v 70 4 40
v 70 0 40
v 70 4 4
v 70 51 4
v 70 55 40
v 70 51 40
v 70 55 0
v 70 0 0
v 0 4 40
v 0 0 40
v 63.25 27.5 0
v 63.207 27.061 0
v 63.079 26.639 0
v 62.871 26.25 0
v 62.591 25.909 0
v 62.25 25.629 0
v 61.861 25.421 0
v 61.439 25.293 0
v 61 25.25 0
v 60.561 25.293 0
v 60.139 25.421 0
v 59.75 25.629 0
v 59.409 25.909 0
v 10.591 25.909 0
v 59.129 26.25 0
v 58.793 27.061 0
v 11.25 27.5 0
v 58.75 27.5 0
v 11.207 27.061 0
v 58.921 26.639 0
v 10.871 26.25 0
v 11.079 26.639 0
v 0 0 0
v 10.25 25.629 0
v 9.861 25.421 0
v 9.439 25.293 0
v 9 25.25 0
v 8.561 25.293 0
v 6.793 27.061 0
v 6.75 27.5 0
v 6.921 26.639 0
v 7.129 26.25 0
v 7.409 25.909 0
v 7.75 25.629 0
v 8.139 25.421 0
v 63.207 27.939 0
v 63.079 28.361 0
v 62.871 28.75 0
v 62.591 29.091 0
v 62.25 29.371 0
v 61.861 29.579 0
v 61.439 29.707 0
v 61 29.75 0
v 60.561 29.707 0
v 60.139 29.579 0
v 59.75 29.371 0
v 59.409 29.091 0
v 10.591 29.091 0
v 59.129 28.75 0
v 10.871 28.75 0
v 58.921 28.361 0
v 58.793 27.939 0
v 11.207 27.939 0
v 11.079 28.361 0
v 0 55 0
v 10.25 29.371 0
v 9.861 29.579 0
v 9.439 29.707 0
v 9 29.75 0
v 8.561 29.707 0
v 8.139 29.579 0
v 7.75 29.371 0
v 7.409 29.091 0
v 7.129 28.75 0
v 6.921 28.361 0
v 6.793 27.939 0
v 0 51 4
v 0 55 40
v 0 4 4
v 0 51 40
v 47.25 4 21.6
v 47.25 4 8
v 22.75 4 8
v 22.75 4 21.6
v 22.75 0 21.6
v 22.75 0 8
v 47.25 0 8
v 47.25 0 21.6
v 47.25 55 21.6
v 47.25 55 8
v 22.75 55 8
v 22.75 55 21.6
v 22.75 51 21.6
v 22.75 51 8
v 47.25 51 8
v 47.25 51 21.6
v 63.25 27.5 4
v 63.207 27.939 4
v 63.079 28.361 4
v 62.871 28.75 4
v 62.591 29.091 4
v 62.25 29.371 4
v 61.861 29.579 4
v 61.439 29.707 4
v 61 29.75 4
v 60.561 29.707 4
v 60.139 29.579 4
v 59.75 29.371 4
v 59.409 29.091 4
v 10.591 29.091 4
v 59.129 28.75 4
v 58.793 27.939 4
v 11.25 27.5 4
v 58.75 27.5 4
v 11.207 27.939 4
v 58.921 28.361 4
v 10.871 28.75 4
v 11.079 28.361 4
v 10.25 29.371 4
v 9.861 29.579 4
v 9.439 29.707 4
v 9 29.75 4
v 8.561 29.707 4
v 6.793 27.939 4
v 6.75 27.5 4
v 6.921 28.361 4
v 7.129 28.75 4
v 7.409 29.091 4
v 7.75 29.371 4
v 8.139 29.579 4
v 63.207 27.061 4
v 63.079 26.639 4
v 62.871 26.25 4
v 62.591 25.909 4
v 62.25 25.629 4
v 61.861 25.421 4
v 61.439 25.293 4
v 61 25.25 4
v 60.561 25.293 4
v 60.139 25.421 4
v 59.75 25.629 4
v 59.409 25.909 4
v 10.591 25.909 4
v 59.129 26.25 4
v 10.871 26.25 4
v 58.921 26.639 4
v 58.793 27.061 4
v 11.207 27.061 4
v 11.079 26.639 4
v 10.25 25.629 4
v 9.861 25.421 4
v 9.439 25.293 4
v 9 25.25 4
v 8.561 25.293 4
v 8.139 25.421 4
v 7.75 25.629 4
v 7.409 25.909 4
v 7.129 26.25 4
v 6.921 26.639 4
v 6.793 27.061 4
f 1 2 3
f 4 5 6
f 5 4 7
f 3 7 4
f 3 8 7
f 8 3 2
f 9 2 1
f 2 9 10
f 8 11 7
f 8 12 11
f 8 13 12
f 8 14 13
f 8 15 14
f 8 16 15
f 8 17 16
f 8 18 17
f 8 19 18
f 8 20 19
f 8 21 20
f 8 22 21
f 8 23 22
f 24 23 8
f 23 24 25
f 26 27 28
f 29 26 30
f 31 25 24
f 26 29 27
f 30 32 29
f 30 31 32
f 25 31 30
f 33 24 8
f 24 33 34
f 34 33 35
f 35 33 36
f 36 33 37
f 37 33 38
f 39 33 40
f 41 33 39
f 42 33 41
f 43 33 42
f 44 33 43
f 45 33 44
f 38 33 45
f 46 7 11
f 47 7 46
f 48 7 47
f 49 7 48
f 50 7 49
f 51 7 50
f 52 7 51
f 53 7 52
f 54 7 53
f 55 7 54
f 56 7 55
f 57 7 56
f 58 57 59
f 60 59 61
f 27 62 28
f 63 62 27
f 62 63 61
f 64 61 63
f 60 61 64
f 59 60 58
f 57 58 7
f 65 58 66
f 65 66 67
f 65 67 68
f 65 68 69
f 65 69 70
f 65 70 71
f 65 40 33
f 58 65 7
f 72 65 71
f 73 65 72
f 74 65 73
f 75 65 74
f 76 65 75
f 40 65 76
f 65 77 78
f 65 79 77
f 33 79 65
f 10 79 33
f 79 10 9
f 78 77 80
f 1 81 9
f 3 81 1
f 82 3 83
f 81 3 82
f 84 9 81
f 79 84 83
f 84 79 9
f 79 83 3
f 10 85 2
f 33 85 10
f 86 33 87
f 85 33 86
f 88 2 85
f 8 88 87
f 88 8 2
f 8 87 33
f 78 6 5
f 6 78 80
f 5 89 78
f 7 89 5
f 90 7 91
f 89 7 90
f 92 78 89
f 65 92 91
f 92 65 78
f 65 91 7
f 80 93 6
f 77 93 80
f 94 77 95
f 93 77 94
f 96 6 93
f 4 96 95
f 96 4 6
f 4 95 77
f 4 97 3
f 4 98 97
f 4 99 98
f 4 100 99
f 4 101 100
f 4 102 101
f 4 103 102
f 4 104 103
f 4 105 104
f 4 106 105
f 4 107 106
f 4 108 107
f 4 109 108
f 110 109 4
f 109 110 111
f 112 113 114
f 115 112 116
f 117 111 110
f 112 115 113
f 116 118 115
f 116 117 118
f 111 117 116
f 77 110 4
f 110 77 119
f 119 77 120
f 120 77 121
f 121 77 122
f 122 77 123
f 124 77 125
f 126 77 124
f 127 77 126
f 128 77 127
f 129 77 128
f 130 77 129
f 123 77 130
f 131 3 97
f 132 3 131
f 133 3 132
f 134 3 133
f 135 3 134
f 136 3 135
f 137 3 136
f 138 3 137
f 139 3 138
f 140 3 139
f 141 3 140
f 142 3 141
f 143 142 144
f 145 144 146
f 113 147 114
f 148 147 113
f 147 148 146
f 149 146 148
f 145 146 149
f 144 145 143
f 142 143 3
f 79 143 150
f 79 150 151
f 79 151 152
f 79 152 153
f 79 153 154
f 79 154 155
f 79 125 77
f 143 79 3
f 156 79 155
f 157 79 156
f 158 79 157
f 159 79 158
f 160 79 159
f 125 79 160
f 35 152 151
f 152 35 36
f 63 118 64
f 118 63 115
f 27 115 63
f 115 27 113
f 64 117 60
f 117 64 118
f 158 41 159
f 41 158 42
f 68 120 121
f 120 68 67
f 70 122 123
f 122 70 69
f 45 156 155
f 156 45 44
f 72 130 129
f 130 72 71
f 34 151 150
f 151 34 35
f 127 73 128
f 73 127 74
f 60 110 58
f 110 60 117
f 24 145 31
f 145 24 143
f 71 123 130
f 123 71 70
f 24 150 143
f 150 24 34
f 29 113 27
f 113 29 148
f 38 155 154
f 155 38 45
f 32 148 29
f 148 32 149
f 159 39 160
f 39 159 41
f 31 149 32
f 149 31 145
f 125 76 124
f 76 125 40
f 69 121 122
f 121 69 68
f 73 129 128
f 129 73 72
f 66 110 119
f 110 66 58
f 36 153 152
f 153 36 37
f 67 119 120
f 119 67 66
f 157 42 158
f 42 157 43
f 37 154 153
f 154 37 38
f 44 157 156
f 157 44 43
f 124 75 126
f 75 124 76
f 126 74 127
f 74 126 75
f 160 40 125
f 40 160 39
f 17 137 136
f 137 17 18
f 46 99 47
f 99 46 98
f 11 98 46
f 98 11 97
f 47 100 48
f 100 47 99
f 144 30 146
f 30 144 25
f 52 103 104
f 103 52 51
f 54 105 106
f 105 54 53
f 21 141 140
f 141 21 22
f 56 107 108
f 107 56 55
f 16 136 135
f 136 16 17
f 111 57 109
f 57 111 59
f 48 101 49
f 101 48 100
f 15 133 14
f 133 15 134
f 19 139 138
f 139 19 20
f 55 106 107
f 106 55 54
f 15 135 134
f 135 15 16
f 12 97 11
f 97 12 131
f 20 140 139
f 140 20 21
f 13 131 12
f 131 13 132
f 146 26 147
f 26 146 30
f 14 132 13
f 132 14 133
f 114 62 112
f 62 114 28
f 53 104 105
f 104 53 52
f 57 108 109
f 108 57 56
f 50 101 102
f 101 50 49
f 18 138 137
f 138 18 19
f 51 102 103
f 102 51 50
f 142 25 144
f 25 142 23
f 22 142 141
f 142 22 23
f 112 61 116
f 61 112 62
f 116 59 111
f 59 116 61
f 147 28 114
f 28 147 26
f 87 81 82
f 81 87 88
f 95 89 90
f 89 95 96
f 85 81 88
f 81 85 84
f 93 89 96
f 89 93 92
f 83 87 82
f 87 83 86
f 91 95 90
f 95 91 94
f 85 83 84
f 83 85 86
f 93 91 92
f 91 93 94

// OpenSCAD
$fn = 32;

// ----------------------------------------------------------------------
// U-bracket: 70 x 55 x 40 mm
// ----------------------------------------------------------------------

// --- parameters (mm) ---
length = 70;              // outer length, X
width = 55;               // outer width, Y
height = 40;              // upright height, Z
thick = 4;                // wall thickness
hole_d = 4.5;             // clearance for M4
window_l = 24.5;          // window length
window_h = 13.6;          // window height

module hole_z(px, py) {
  translate([px, py, -2.5]) cylinder(h = thick + 5, d = hole_d);
}
module hole_y_pz(pz) {
  /* through both uprights along Y */
  translate([0, -2.5, pz]) rotate([-90, 0, 0]) cylinder(h = width + 5, d = hole_d);
}

module base() {
  cube([length, width, thick]);
}

module uprights() {
  cube([length, thick, height]);
  translate([0, width - thick, 0]) cube([length, thick, height]);
}

difference() {
  union() {
    base();
    uprights();
  }
  hole_z(9, 27.5);
  hole_z(61, 27.5);
  /* lightening window through both uprights */
  translate([length / 2 - window_l / 2, -1, thick + 4])
    cube([window_l, width + 2, window_h]);
}
